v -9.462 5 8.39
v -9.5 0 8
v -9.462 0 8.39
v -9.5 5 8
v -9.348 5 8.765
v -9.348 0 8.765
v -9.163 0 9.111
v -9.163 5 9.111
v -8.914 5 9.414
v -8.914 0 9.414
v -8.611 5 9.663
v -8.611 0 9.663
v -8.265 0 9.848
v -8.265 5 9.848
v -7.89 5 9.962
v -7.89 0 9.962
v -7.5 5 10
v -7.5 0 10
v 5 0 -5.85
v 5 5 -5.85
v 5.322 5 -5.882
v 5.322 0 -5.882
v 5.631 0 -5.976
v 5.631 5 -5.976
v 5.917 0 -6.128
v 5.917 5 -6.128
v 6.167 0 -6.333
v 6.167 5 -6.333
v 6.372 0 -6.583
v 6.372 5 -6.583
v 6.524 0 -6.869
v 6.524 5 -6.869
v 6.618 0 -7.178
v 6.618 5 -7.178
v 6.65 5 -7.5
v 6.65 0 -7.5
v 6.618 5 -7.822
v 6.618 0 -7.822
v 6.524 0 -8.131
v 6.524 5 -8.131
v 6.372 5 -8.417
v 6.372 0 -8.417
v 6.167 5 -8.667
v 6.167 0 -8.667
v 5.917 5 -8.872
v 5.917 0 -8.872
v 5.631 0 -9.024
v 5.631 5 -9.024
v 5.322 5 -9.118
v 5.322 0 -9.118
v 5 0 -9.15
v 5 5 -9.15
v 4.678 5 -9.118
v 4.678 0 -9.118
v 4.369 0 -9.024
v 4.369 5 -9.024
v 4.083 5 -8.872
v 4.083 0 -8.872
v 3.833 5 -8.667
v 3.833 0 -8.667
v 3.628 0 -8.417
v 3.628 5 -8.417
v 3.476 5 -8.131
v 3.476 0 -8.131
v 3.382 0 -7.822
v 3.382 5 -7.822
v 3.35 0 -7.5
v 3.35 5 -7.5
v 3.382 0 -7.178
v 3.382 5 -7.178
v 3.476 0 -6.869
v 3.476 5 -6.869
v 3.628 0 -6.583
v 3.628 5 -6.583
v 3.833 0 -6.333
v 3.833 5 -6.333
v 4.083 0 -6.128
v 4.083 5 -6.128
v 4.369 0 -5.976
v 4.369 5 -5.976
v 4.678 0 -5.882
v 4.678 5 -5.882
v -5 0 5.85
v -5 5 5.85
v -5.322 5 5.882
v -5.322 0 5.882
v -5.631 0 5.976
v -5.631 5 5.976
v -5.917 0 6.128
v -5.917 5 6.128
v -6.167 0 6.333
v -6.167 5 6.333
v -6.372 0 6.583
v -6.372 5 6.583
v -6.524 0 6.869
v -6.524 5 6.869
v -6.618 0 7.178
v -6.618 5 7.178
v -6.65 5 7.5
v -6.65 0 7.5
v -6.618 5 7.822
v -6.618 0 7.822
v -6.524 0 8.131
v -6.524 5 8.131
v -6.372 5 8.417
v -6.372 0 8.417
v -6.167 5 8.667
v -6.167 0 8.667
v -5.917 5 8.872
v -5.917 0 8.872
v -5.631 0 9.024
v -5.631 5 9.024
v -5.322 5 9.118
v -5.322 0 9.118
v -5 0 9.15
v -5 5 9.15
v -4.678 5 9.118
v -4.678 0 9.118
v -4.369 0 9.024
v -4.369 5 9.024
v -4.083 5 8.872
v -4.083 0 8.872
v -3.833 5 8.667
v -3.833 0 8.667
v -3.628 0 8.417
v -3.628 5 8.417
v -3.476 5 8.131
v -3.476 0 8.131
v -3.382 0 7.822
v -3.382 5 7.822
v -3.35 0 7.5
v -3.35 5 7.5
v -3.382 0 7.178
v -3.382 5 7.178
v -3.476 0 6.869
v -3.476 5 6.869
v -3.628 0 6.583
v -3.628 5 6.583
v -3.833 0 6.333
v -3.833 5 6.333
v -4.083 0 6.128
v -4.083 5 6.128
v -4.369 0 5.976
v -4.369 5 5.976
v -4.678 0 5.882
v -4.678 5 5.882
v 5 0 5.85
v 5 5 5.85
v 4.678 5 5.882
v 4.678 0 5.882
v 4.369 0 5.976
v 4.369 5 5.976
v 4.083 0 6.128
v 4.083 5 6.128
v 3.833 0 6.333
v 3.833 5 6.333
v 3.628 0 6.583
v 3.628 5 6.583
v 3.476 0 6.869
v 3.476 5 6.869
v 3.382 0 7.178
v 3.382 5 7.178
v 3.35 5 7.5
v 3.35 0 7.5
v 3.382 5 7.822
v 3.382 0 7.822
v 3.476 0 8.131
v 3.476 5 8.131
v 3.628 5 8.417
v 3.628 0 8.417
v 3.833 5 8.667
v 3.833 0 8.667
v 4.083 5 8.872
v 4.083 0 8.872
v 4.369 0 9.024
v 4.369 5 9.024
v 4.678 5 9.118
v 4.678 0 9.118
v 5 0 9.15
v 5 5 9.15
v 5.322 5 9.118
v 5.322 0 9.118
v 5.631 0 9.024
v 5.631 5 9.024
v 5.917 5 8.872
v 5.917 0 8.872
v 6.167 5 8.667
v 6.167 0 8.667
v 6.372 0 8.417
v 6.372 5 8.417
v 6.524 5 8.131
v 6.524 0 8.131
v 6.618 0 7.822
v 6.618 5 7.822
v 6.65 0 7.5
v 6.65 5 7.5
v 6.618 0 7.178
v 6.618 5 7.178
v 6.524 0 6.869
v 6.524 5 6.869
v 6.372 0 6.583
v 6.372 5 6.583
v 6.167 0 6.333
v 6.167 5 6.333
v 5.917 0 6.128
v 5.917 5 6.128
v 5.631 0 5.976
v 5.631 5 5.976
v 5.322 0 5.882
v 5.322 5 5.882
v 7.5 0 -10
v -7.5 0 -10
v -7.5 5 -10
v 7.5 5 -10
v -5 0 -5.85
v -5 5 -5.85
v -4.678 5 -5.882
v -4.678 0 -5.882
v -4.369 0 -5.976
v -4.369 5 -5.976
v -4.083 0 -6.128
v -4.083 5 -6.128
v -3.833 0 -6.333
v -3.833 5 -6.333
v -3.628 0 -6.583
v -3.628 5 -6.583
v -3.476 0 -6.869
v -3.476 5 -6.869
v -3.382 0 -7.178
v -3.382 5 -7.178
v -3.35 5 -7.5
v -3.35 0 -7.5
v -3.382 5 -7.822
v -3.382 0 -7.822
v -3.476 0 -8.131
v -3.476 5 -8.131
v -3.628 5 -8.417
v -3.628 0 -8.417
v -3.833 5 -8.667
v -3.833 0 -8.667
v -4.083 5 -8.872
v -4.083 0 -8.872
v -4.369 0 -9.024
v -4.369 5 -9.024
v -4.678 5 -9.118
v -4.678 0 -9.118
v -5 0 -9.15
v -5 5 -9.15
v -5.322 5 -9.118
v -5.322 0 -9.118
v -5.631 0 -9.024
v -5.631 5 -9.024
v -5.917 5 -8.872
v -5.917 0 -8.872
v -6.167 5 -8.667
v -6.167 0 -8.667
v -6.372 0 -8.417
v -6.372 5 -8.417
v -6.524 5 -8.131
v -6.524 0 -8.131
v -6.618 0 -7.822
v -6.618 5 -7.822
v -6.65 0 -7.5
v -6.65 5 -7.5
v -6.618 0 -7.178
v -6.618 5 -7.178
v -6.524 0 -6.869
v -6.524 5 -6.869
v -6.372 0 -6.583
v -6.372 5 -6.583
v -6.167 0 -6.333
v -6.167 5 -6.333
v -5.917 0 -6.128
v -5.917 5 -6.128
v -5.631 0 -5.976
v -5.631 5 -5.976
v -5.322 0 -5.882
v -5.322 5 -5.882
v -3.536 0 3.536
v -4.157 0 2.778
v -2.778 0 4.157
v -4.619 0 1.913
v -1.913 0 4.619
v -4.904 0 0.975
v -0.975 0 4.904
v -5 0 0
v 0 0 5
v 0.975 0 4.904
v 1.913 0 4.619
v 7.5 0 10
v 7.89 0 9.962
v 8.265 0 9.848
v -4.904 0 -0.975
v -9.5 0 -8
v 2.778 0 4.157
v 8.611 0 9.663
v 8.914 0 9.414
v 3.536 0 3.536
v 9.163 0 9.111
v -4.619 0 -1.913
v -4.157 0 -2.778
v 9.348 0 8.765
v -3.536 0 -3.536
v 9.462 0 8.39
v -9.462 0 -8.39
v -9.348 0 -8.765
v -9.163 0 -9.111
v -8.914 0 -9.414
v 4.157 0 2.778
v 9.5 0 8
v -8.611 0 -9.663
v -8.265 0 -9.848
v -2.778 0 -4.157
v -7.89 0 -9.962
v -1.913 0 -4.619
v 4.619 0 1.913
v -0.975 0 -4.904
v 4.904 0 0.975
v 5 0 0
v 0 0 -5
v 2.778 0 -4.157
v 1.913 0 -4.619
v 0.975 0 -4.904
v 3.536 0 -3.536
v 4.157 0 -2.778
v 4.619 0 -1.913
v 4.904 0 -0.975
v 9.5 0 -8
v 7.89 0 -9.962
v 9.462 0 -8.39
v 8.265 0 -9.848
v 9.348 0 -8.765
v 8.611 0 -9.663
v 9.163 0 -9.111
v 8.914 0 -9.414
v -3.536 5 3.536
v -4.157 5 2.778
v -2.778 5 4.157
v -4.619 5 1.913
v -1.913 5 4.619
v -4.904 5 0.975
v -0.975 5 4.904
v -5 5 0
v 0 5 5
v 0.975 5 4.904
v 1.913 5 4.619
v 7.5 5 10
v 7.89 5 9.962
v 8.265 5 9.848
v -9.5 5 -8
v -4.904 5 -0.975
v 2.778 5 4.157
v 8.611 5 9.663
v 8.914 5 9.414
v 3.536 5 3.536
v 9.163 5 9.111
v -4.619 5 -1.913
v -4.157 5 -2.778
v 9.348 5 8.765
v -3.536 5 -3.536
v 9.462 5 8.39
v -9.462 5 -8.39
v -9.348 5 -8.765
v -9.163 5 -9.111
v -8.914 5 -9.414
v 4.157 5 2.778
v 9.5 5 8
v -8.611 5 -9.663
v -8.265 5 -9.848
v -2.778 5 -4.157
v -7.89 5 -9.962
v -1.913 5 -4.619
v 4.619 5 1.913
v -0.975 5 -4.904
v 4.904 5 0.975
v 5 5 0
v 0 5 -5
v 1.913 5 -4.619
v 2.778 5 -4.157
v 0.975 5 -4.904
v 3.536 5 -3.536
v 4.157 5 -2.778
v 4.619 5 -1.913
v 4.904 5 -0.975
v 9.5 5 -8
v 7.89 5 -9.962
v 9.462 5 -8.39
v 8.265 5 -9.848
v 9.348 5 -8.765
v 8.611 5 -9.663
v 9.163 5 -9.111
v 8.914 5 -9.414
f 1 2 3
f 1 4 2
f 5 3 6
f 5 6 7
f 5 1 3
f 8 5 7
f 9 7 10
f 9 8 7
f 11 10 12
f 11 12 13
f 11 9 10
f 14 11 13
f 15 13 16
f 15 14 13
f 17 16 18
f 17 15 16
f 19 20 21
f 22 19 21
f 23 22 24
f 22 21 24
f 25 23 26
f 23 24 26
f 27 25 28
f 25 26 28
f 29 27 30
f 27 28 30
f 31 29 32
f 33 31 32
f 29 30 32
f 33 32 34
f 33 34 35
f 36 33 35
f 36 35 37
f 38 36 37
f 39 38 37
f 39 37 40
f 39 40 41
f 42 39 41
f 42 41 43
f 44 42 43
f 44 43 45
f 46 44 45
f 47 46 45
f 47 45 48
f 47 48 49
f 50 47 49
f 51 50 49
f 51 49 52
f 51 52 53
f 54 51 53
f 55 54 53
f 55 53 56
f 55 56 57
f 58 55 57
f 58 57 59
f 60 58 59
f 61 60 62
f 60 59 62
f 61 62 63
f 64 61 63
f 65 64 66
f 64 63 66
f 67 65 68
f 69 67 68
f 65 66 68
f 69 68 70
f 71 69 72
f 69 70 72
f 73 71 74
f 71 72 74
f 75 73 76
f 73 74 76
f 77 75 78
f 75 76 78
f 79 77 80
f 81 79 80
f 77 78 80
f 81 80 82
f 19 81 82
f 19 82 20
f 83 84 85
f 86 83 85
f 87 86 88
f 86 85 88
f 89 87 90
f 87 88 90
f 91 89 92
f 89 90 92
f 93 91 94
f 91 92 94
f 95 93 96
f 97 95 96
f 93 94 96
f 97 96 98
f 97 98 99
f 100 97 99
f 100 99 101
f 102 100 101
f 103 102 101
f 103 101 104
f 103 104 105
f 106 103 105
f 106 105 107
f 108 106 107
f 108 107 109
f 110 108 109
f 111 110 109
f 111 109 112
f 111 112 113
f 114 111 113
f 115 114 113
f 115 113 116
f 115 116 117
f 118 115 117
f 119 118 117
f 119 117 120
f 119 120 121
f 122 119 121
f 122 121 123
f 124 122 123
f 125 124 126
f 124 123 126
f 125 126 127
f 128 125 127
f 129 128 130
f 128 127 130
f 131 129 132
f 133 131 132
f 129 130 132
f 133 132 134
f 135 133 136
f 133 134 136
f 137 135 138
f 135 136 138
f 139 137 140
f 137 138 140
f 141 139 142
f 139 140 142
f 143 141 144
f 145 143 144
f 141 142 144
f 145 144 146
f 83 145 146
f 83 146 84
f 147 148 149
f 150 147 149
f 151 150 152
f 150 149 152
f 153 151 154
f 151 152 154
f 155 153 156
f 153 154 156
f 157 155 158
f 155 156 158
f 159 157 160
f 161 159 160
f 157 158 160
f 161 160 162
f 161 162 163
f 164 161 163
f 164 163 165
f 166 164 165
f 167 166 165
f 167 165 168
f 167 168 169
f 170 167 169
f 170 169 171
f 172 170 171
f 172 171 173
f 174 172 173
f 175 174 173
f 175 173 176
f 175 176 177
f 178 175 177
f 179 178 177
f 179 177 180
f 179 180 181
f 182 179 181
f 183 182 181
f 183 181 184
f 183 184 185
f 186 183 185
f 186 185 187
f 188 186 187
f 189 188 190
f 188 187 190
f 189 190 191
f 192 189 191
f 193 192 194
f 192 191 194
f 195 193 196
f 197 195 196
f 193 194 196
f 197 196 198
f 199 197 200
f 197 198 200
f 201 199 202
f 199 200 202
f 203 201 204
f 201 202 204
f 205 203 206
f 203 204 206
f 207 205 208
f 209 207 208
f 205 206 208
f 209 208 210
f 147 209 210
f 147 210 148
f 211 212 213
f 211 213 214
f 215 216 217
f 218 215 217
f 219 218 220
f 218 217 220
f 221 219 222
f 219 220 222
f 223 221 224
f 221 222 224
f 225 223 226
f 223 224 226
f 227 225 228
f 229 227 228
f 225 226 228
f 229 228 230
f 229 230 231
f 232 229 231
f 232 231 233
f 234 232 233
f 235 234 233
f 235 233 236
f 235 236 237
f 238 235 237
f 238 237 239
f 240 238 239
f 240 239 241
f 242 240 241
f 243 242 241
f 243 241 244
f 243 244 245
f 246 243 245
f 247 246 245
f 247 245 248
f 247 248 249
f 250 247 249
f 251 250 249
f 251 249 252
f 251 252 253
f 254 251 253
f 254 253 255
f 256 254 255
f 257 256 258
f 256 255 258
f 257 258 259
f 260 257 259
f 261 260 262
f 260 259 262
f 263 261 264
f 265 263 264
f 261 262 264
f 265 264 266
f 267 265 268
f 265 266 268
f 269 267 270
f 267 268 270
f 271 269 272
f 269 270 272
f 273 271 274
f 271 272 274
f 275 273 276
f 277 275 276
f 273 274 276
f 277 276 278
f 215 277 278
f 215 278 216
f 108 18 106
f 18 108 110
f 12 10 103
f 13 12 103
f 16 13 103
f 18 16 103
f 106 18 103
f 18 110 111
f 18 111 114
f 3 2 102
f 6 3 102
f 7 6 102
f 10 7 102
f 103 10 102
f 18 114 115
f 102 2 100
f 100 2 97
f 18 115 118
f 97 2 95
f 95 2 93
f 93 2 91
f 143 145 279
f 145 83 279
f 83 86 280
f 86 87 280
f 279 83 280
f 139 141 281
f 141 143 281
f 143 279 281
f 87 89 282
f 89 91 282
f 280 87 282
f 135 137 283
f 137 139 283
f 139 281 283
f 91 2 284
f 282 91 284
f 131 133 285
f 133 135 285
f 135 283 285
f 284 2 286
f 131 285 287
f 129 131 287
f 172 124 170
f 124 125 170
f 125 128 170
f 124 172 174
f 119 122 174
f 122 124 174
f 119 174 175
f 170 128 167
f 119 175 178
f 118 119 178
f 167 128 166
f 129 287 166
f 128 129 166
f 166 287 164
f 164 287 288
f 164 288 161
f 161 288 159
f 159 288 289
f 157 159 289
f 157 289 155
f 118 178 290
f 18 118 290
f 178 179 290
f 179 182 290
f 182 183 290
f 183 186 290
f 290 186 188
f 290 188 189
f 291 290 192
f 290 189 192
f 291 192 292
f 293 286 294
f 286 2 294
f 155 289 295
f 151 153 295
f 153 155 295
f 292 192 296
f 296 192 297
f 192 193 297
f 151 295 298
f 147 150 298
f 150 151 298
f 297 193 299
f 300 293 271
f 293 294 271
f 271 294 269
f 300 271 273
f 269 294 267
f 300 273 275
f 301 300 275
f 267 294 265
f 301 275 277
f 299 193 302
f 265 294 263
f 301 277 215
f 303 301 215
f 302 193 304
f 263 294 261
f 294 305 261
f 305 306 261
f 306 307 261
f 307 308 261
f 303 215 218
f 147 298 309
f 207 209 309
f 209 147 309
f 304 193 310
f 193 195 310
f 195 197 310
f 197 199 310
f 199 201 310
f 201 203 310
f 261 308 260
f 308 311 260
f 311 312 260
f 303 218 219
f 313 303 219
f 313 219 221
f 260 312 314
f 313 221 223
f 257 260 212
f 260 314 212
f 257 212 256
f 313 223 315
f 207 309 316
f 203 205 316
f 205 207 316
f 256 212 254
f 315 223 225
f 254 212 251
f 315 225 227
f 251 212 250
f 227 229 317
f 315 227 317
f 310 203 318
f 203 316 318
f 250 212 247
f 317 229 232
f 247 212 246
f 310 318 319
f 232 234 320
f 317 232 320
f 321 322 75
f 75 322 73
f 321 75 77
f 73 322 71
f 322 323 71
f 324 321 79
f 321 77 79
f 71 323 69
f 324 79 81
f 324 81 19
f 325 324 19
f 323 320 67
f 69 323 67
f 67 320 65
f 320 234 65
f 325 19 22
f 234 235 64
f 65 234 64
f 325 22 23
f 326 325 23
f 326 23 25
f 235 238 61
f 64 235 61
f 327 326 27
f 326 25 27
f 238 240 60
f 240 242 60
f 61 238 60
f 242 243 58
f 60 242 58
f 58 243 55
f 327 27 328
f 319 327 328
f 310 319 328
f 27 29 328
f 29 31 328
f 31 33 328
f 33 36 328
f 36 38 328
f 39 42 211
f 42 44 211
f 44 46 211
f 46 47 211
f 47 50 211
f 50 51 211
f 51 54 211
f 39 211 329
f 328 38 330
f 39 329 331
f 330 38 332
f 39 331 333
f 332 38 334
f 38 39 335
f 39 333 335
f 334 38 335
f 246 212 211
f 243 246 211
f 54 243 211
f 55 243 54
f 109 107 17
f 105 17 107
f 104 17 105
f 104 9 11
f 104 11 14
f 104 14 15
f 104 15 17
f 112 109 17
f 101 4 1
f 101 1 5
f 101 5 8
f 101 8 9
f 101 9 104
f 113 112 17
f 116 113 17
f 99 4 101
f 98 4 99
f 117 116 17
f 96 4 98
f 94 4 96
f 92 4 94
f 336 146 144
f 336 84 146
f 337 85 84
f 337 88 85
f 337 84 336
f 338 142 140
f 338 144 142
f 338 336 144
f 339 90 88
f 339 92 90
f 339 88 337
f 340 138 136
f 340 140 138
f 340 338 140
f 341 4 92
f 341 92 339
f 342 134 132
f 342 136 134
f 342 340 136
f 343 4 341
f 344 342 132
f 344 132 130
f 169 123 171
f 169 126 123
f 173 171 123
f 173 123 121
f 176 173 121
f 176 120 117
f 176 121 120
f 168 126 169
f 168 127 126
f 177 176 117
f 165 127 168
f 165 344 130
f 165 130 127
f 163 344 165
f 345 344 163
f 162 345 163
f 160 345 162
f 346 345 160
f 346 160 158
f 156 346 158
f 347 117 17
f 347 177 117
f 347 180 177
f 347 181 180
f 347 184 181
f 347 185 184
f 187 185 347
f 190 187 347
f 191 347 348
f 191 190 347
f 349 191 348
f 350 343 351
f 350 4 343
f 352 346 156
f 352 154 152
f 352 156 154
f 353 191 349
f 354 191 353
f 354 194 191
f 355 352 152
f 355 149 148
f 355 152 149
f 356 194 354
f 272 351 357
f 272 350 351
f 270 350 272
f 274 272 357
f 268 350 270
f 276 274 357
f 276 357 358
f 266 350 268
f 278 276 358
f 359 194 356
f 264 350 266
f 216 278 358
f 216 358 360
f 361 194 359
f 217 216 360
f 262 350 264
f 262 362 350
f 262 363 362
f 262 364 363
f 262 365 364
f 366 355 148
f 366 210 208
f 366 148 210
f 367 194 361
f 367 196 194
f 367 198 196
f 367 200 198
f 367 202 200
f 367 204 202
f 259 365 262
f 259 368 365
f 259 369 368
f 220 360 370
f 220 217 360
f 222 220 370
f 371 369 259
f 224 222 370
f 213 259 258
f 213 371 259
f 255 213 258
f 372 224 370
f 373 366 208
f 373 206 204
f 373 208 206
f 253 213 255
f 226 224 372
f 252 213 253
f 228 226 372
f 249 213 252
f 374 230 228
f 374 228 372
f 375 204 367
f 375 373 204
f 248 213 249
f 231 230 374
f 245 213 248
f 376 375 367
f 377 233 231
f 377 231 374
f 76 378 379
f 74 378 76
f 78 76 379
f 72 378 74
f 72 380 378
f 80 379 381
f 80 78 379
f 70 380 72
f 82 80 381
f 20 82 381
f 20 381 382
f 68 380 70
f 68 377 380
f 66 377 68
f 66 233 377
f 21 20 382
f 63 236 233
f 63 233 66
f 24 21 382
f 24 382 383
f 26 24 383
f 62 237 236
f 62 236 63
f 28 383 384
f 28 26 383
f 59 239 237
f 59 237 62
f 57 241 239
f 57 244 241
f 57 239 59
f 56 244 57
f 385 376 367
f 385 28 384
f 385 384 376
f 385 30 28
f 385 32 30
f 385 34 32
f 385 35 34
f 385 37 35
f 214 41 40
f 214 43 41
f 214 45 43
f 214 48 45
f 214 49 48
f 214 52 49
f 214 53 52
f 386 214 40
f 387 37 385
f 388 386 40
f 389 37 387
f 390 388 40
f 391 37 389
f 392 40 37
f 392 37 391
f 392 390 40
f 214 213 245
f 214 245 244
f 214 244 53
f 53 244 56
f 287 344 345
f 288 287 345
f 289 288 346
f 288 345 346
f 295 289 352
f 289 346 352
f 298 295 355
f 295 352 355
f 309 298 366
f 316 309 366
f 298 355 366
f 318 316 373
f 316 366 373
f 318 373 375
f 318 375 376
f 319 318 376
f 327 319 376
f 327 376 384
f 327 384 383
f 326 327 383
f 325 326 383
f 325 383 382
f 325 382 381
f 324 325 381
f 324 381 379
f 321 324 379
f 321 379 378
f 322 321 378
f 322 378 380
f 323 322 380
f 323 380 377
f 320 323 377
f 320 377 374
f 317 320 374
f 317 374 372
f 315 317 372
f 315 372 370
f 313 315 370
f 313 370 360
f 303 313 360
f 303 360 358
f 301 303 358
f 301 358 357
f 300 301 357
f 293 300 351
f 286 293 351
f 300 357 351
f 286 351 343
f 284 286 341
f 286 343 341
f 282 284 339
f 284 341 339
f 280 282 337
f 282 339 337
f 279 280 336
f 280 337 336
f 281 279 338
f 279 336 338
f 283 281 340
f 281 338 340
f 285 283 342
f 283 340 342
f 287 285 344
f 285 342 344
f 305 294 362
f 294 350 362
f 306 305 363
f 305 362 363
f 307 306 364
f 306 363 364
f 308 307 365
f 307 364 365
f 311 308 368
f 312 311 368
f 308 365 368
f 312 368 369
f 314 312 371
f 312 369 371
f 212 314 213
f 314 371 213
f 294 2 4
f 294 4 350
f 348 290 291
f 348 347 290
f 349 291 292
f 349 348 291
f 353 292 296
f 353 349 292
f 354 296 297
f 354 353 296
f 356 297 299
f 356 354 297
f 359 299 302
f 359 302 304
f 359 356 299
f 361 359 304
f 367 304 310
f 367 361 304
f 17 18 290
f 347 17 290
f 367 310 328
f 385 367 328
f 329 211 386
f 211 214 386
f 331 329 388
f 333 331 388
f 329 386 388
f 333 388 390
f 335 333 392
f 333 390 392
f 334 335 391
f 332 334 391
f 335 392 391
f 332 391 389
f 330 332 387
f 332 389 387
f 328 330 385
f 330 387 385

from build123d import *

# Parameters (mm, degrees)
SKETCH_1_W          = 19
SKETCH_1_H          = 20
EXTRUDE_1_DEPTH     = 5
SKETCH_2_R          = 1.65
CUT_EXTRUDE_1_DEPTH = 15.671400751
FILLET_1_R          = 2
SKETCH_3_R          = 5
CUT_EXTRUDE_2_DEPTH = 10


with BuildPart() as part:
    # 草图1 → 凸台-拉伸1 (new body)
    with BuildSketch(Plane(origin=(0, 0, 0), x_dir=(1, 0, 0), z_dir=(0, 1, 0))):
        Rectangle(SKETCH_1_W, SKETCH_1_H)
    extrude(amount=EXTRUDE_1_DEPTH)

    # 草图2 → 切除-拉伸1 (cut, through all)
    with BuildSketch(Plane(origin=(0, 5, 0), x_dir=(1, 0, 0), z_dir=(0, 1, 0))):
        with Locations(Location((-5, 7.5, 0), (0, 0, 270))):
            Circle(SKETCH_2_R)
        with Locations(Location((5, 7.5, 0), (0, 0, 270))):
            Circle(SKETCH_2_R)
        with Locations(Location((5, -7.5, 0), (0, 0, 90))):
            Circle(SKETCH_2_R)
        with Locations(Location((-5, -7.5, 0), (0, 0, 90))):
            Circle(SKETCH_2_R)
    extrude(amount=-CUT_EXTRUDE_1_DEPTH, mode=Mode.SUBTRACT)

    # 圆角1
    fillet_1_edges = [part.edges().sort_by_distance(p)[0] for p in [
        (9.5, 2.5, 10),
        (-9.5, 2.5, 10),
        (-9.5, 2.5, -10),
        (9.5, 2.5, -10),
    ]]
    fillet(fillet_1_edges, radius=FILLET_1_R)

    # 草图3 → 切除-拉伸2 (cut)
    with BuildSketch(Plane(origin=(0, 5, 0), x_dir=(1, 0, 0), z_dir=(0, 1, 0))):
        with Locations(Location((0, 0, 0), (0, 0, 270))):
            Circle(SKETCH_3_R)
    extrude(amount=-CUT_EXTRUDE_2_DEPTH, mode=Mode.SUBTRACT)


solid = part.part
